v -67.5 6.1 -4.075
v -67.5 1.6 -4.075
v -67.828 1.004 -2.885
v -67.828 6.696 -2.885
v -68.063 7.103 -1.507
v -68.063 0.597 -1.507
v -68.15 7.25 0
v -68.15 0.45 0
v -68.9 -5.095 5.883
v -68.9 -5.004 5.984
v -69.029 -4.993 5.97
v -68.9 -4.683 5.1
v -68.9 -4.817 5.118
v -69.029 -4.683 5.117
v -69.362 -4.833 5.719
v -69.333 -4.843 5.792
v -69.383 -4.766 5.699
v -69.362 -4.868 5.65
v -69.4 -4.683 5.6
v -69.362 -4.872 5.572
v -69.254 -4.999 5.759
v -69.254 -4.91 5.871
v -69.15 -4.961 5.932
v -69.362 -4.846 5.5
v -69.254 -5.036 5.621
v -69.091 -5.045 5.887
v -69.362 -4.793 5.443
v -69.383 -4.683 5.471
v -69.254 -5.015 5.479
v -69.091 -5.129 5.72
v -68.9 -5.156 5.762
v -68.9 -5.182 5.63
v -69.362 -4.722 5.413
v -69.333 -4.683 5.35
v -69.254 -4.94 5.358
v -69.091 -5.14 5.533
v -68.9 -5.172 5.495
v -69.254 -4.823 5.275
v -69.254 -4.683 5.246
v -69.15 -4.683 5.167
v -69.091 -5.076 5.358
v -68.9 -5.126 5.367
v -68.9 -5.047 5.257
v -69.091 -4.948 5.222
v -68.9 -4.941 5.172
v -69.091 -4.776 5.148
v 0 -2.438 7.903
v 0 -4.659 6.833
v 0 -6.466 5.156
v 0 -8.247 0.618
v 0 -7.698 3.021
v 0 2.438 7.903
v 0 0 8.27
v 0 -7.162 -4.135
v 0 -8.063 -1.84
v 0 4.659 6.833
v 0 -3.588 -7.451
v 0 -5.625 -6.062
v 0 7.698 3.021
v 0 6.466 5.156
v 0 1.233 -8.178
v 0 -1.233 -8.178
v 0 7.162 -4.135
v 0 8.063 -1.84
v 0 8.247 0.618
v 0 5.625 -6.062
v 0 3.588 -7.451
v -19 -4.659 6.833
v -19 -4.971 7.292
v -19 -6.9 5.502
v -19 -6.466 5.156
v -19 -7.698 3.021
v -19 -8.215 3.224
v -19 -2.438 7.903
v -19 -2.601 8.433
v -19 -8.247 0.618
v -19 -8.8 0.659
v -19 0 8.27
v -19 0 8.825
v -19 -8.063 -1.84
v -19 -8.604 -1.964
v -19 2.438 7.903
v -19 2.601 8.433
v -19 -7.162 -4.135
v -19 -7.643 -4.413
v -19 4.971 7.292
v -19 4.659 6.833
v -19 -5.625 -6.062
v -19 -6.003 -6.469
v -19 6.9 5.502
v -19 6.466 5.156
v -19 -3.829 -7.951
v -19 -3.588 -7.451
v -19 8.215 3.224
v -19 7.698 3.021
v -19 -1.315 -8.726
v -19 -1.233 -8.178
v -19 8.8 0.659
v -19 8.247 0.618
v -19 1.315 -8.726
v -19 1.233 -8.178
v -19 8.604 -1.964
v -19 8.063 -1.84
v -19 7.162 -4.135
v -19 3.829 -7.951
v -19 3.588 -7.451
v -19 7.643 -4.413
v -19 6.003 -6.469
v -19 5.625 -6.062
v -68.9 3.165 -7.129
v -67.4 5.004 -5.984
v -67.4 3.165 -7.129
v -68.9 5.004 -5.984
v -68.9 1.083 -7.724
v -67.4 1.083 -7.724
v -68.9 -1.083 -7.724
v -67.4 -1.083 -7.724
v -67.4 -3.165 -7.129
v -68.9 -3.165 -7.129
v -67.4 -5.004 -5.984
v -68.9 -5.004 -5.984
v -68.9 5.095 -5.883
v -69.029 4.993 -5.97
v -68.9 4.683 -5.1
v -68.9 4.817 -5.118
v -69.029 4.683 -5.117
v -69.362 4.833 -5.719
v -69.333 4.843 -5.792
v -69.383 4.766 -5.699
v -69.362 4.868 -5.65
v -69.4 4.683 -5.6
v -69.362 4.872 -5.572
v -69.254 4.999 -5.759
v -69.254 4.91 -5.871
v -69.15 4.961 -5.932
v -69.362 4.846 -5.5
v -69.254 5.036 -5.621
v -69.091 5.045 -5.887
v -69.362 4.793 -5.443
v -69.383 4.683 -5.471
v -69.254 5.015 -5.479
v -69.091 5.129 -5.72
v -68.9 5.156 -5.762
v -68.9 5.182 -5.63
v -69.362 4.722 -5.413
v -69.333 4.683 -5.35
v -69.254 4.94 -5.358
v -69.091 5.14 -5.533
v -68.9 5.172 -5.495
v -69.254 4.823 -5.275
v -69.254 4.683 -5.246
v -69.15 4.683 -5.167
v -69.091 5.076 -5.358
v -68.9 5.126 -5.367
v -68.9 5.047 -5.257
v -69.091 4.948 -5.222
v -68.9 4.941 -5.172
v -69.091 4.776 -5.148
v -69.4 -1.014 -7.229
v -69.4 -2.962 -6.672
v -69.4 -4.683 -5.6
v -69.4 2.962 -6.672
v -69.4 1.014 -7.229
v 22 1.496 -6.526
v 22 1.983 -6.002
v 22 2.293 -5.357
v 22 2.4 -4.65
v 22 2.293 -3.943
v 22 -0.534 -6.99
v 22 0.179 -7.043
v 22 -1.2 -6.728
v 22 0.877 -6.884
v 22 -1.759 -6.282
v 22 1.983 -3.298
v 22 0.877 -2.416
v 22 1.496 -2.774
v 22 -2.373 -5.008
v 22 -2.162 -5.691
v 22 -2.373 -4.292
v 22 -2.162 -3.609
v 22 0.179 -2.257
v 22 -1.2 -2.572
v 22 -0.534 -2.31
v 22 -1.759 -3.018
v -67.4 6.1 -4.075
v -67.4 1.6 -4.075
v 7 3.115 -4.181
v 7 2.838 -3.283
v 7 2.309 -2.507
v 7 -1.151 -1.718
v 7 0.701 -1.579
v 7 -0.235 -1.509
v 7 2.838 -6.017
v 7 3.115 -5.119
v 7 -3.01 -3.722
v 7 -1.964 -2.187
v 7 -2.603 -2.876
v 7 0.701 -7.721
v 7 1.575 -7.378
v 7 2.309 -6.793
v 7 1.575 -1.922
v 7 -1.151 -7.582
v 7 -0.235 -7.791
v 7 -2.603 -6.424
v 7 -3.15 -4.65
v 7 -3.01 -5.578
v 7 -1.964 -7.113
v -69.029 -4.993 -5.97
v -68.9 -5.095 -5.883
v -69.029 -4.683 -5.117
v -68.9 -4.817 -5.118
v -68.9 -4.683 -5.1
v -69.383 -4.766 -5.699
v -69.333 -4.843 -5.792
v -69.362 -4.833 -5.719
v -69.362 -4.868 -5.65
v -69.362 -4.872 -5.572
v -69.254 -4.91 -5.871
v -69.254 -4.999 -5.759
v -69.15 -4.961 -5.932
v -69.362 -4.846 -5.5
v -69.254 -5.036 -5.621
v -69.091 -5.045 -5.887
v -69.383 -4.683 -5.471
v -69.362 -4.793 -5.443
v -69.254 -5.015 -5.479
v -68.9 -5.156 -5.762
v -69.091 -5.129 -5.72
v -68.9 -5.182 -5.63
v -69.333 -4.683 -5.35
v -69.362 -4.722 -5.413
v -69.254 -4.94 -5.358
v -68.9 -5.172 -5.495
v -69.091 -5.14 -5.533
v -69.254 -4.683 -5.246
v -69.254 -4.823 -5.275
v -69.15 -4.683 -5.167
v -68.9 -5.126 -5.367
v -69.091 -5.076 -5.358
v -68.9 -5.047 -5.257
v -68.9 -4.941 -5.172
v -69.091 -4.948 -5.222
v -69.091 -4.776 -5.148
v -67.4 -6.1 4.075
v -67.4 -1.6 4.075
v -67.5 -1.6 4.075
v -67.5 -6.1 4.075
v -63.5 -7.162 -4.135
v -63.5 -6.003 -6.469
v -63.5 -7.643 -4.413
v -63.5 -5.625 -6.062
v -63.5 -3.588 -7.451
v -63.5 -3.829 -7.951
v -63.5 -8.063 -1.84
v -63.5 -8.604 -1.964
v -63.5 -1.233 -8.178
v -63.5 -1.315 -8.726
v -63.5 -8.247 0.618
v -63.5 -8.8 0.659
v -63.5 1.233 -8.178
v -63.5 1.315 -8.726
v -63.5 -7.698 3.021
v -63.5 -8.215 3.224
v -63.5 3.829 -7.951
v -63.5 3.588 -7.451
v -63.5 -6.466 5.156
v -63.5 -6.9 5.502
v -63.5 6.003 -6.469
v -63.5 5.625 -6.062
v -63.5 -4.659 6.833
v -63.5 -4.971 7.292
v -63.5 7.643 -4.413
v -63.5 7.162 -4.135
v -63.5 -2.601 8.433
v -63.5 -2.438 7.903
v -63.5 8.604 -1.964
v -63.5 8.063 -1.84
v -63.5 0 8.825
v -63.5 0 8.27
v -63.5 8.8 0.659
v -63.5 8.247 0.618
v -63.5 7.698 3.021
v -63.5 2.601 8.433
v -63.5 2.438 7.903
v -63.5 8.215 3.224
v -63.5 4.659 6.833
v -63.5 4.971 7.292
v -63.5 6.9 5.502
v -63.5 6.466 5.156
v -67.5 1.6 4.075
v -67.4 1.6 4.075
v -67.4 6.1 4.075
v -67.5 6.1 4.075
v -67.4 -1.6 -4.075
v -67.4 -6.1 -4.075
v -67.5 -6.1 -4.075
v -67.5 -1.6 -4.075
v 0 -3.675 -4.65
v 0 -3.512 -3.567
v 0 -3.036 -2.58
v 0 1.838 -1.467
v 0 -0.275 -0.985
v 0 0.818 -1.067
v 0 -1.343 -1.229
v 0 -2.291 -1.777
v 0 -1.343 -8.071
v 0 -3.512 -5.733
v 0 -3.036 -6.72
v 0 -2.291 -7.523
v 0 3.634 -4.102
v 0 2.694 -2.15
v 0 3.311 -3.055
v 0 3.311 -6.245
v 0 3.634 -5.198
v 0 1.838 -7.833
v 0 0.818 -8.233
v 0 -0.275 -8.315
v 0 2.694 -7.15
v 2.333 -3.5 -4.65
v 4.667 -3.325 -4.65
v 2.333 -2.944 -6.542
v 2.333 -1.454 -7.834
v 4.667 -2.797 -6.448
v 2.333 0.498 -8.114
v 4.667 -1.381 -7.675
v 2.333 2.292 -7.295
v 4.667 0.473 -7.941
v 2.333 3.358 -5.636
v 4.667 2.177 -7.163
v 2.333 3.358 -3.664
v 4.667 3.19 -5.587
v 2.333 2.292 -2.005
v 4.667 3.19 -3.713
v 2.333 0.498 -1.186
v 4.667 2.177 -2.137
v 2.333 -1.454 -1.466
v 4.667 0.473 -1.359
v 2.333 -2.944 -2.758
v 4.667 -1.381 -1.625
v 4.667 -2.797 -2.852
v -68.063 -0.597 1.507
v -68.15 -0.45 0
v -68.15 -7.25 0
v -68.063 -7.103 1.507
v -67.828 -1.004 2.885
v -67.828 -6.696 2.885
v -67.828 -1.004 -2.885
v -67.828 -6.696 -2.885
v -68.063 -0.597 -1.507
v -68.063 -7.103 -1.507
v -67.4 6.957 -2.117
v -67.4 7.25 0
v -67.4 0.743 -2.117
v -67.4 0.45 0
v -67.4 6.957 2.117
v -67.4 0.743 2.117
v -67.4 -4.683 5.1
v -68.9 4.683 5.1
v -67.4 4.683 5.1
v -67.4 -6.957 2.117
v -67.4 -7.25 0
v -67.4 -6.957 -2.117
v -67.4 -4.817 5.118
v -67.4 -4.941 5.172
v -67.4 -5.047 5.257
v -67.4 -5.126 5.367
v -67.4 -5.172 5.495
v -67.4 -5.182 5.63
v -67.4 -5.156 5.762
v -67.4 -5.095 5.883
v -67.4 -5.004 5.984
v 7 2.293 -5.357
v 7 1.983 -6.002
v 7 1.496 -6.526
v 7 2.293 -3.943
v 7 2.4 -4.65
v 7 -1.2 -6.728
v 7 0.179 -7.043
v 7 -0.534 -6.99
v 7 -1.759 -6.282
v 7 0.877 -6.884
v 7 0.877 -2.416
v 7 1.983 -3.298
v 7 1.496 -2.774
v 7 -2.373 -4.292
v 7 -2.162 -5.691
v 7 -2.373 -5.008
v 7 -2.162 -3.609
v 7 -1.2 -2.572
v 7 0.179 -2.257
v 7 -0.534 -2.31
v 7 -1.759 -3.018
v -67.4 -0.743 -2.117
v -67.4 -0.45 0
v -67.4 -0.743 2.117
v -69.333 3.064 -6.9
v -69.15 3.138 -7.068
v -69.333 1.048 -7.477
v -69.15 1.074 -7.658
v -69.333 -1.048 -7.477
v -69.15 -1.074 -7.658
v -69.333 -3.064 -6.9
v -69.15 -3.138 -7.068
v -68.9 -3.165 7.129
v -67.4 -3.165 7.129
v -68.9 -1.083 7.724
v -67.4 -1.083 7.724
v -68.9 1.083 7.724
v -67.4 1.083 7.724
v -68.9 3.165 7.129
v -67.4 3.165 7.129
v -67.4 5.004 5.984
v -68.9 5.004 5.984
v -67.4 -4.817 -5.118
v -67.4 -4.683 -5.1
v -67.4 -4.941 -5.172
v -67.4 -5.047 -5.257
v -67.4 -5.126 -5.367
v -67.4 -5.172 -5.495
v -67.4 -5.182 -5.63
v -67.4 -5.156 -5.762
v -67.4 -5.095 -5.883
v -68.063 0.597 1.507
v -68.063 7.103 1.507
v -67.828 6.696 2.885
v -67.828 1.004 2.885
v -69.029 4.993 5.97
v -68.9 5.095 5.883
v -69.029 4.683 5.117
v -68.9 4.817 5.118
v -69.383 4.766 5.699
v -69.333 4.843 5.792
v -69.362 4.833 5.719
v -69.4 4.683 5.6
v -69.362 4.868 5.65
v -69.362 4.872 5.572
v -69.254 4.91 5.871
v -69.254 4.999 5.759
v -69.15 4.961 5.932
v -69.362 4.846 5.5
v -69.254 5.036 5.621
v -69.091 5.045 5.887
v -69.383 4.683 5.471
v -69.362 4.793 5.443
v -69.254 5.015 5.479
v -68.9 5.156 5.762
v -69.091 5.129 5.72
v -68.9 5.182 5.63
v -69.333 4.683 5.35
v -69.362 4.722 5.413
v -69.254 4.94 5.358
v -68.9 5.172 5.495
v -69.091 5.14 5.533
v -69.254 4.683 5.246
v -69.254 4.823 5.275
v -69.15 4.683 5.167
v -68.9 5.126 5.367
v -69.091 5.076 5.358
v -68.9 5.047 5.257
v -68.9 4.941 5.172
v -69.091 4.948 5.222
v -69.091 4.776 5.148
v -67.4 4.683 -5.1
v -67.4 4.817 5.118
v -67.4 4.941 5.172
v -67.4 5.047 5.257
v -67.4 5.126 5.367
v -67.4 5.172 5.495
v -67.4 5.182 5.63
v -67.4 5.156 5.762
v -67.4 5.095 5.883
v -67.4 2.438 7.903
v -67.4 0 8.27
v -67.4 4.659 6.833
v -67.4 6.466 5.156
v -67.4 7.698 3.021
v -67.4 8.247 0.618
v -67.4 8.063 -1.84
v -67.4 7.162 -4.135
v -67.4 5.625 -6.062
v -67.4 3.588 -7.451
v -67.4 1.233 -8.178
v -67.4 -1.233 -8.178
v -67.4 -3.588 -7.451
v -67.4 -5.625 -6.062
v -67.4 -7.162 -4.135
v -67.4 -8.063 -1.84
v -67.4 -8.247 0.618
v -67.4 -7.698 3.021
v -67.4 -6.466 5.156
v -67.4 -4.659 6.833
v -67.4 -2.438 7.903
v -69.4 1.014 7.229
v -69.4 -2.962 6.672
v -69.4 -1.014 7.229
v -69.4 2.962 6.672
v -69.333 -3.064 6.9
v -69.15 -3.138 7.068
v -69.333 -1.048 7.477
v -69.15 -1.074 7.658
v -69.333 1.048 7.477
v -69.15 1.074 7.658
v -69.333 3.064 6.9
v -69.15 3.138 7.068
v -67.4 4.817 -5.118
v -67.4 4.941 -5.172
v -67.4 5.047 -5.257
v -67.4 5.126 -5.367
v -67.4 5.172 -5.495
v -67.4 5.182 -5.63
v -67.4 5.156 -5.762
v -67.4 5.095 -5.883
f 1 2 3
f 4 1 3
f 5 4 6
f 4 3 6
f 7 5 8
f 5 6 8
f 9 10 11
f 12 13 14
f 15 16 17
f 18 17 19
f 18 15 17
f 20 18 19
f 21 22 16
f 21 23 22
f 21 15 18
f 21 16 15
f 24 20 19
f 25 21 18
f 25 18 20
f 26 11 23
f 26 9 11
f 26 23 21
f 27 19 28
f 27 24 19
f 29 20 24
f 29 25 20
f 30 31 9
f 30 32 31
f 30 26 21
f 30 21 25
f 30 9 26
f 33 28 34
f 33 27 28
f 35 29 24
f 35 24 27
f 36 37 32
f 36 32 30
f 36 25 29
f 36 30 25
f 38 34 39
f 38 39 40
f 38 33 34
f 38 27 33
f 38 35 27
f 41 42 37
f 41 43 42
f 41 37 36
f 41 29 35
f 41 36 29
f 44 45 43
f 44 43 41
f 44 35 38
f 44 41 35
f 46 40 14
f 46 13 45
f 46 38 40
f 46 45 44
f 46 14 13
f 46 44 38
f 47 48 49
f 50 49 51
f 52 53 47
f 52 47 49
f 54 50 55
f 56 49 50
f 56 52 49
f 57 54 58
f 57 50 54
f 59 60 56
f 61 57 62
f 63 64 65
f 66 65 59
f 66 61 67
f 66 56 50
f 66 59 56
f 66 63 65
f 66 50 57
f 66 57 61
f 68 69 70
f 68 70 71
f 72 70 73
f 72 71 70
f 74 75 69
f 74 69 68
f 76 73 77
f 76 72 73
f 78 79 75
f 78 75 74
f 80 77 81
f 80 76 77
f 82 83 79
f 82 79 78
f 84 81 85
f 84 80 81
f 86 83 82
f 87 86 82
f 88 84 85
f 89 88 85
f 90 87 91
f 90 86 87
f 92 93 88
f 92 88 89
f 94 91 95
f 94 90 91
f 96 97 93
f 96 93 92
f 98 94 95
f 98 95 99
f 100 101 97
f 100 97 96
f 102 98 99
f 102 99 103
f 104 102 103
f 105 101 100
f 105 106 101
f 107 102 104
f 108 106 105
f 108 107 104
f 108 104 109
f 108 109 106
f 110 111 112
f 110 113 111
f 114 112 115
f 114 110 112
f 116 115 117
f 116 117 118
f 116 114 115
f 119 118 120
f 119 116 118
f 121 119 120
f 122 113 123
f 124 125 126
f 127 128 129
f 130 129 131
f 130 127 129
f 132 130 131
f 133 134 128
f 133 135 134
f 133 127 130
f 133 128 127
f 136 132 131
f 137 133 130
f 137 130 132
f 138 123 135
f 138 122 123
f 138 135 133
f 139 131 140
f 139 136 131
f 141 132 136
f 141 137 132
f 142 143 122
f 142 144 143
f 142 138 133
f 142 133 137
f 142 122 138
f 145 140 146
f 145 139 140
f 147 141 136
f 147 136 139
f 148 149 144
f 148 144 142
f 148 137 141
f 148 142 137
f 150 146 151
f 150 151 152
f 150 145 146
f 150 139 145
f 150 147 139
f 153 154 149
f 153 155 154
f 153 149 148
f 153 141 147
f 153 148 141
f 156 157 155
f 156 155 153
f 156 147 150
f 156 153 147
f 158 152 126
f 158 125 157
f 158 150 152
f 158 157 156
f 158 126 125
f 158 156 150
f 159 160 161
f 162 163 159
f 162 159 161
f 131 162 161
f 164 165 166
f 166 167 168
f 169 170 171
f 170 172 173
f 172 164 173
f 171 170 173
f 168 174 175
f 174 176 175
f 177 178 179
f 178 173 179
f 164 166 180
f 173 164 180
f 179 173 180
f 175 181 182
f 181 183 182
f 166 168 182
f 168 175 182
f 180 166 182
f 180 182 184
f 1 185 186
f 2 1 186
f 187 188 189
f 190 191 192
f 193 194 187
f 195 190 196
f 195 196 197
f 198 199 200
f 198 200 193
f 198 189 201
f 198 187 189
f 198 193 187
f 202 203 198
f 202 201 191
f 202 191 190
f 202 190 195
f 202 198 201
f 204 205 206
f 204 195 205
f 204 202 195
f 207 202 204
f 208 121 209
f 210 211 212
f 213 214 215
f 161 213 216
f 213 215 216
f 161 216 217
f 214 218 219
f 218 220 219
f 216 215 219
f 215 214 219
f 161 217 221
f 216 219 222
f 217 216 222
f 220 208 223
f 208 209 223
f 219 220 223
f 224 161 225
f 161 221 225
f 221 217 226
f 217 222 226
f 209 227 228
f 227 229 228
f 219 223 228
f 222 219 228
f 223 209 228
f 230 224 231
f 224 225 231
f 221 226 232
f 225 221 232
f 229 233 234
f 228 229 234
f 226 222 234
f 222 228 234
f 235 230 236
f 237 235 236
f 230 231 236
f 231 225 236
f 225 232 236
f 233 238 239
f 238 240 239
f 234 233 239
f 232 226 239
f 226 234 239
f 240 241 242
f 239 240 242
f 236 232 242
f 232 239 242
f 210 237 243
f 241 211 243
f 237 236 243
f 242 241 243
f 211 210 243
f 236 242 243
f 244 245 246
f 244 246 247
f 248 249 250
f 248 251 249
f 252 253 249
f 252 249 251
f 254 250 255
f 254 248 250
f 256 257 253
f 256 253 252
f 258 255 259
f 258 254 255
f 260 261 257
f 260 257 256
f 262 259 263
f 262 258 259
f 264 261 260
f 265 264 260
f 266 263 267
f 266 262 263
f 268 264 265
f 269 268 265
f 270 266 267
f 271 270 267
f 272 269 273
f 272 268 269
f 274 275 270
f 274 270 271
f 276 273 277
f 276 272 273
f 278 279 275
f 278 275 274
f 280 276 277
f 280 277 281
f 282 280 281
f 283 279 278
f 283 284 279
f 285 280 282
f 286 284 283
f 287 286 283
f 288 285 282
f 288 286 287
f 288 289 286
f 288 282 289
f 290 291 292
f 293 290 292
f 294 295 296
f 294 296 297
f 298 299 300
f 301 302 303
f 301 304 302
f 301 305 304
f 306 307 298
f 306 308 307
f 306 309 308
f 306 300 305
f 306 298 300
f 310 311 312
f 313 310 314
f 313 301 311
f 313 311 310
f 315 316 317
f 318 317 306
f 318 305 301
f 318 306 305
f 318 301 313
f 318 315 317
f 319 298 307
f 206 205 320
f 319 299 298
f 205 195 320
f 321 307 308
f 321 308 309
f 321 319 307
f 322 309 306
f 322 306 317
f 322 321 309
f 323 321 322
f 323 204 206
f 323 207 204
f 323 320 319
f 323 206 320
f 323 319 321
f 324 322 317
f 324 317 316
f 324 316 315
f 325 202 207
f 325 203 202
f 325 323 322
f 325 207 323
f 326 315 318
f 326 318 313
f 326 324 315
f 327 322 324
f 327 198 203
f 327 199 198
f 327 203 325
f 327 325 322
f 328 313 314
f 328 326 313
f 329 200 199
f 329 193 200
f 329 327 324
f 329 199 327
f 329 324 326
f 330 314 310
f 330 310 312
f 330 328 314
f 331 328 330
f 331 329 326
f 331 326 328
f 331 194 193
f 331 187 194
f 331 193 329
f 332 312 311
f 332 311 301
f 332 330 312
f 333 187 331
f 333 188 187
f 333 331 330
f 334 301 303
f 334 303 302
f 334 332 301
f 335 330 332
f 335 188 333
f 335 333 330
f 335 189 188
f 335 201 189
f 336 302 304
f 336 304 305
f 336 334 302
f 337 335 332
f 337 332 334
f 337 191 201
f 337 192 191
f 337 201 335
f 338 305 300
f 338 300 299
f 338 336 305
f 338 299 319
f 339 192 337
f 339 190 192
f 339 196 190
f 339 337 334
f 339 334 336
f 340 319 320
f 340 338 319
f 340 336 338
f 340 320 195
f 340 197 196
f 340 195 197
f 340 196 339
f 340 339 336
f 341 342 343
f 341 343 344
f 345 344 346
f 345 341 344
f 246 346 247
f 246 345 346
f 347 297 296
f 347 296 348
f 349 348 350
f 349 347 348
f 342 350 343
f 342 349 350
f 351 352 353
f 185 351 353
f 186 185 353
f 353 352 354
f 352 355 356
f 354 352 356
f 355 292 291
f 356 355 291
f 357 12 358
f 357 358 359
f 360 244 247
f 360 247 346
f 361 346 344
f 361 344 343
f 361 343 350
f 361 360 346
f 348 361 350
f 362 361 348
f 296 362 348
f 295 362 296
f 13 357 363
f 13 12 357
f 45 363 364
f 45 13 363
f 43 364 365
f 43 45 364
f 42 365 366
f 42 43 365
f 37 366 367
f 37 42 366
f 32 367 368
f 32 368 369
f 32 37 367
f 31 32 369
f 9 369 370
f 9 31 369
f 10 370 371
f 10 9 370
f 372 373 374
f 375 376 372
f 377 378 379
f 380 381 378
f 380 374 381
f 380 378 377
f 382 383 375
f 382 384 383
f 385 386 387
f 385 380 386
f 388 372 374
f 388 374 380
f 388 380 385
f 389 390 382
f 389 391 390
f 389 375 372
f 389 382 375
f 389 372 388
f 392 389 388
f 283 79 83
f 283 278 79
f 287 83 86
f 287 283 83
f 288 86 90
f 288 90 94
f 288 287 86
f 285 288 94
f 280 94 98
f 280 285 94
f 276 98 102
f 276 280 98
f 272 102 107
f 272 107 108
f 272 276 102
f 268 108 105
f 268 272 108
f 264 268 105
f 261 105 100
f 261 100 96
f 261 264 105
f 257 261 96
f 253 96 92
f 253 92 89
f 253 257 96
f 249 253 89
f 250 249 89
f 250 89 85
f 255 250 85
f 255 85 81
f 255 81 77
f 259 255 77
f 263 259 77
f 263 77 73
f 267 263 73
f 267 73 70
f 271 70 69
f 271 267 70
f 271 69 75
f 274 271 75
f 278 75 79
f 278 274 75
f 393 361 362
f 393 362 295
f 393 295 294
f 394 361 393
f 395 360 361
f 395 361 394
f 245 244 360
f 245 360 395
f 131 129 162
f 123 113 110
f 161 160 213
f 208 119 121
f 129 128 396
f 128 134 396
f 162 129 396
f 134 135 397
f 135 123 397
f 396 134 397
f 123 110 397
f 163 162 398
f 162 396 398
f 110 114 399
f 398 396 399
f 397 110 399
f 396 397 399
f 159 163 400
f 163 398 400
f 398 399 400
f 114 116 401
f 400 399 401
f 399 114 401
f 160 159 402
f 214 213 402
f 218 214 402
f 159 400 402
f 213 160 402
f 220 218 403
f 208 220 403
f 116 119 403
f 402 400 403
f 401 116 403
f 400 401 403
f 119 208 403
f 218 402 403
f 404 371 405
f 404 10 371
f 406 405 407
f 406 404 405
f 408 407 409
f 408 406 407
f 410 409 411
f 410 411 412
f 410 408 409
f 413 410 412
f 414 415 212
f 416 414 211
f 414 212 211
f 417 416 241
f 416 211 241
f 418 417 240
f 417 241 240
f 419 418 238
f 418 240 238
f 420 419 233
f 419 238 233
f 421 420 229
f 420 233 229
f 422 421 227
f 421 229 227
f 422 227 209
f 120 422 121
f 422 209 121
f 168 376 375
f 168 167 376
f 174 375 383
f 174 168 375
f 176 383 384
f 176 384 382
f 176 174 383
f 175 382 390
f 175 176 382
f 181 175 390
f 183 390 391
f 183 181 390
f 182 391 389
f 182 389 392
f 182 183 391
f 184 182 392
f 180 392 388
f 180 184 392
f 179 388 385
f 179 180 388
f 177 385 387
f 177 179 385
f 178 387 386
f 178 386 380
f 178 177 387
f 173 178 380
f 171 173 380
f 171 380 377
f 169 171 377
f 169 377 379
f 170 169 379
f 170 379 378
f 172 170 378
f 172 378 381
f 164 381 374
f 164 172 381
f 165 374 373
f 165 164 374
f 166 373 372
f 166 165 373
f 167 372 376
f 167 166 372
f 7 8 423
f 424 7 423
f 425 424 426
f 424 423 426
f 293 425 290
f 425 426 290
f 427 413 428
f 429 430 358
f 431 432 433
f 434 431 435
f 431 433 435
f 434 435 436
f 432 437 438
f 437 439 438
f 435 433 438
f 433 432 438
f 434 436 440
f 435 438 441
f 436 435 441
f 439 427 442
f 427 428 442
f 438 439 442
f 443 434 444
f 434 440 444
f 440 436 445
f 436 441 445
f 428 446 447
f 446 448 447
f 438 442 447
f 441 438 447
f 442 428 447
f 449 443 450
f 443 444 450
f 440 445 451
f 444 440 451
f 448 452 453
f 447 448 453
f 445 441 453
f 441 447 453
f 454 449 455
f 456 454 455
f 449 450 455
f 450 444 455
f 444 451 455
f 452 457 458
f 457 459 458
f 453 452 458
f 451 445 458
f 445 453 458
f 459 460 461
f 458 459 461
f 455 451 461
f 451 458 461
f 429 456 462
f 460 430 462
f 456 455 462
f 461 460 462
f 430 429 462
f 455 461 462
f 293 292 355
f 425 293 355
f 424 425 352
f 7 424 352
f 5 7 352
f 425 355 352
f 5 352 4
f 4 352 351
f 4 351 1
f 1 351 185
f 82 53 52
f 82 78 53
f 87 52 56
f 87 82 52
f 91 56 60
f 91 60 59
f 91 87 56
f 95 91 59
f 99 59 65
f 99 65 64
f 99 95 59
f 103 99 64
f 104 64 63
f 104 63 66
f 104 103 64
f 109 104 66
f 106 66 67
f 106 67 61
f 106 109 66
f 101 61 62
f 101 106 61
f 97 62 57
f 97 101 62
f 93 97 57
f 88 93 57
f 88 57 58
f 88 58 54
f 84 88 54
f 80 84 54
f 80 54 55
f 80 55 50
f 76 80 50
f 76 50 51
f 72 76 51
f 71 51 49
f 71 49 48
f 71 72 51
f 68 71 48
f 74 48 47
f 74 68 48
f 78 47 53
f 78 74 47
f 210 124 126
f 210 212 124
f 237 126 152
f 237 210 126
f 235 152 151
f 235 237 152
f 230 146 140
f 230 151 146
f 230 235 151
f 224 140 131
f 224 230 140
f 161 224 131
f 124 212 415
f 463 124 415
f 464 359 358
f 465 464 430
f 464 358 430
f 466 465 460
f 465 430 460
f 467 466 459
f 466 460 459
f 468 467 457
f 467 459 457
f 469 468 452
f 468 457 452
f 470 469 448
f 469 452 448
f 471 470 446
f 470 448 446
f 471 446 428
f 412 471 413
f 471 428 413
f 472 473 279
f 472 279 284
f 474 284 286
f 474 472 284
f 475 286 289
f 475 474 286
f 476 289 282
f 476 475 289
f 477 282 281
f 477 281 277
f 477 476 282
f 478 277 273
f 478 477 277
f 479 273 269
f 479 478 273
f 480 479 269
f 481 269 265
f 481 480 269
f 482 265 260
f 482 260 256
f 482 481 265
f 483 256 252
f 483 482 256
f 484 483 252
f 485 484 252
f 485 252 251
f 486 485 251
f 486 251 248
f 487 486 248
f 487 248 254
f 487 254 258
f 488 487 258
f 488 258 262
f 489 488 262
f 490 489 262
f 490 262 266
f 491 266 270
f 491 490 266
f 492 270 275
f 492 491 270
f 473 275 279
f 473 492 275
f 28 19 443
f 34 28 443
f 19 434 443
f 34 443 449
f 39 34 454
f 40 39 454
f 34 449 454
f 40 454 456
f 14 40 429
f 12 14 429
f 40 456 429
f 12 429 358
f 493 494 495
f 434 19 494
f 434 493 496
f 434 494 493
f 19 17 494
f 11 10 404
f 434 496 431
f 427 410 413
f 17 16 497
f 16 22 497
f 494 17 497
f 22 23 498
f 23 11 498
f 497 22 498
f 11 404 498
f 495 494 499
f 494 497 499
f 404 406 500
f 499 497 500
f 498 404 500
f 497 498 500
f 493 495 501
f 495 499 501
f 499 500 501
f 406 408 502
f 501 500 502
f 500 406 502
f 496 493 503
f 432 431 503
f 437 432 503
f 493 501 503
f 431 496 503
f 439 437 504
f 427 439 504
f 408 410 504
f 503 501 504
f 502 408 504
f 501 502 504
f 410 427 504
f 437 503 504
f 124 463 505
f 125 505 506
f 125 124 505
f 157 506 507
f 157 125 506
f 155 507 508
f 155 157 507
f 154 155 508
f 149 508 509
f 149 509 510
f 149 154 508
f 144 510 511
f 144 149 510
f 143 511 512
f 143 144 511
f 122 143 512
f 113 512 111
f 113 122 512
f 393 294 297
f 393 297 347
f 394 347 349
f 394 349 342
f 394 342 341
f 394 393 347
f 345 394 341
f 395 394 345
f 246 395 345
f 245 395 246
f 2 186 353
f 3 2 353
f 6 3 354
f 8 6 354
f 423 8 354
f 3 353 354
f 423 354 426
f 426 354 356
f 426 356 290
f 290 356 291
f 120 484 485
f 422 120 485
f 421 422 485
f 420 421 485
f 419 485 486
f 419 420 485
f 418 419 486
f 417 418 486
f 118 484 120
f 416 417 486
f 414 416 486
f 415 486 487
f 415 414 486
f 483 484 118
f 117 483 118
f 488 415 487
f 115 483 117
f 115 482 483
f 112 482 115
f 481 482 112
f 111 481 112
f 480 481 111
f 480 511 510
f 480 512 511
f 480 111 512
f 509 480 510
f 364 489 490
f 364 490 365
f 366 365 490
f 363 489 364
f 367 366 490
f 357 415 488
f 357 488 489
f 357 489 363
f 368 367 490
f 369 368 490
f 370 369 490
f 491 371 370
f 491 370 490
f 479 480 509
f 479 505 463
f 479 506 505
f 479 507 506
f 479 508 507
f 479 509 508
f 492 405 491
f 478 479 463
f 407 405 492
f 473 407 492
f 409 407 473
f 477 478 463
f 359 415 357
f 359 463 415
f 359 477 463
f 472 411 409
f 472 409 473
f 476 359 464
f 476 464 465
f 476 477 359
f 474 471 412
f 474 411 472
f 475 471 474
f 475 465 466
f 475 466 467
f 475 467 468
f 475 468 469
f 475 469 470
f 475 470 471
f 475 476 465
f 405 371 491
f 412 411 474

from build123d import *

# Parameters (mm, degrees)
F2_W      = 2
F2_H      = 10.2
F3_DEPTH  = 12.5
F4_R      = 0.5
F8_W      = 15
F8_H      = 2.4
F11_DEPTH = 0.75
F13_DEPTH = 8.826


with BuildPart() as f1:
    # F0 (on Front) → F1 (revolve)
    with BuildSketch(Plane.XZ):
        Polygon((-69.4, 7.8), (-69.4, 0), (0, 0), (0, 8.27), (-19, 8.27), (-19, 8.825), (-63.5, 8.825), (-63.5, 8.27), (-67.4, 8.27), (-67.4, 7.8), align=None)
    revolve(axis=Axis((-34.7, 0, 0), (-1, 0, 0)))

    # F2 (on Front) → F3 (cut, symmetric)
    with BuildSketch(Plane.XZ):
        with Locations((-68.4, 0)):
            Rectangle(F2_W, F2_H)
    extrude(amount=F3_DEPTH, both=True, mode=Mode.SUBTRACT)

    # F4
    f4_edges = [f1.edges().sort_by_distance(p)[0] for p in [
        (-69.4, 0, 5.1),
        (-68.4, 5.901695, 5.1),
        (-68.4, -5.901695, 5.1),
        (-69.4, 0, 7.8),
        (-68.4, 5.901695, -5.1),
        (-68.4, -5.901695, -5.1),
        (-69.4, 0, -7.8),
        (-69.4, 0, -5.1),
    ]]
    fillet(f4_edges, radius=F4_R)


with BuildPart() as f7:
    # F6 (on offset) → F7 (revolve)
    with BuildSketch(Plane.XY.offset(-4.65)):
        Polygon((0, 0), (0, -3.675), (7, -3.15), (7, 0), align=None)
    revolve(axis=Axis((3.5, 0, -4.65), (1, 0, 0)))


with BuildPart() as f9:
    # F8 (on offset) → F9 (revolve)
    with BuildSketch(Plane.XY.offset(-4.65)):
        with Locations((14.5, 1.2)):
            Rectangle(F8_W, F8_H)
    revolve(axis=Axis((14.5, 0, -4.65), (1, 0, 0)))


with BuildPart() as f11:
    # F10 (on face) → F11 (new body)
    with BuildSketch(Plane(origin=(-67.4, 0, 0), x_dir=(0, -1, 0), z_dir=(-1, 0, 0))):
        with BuildLine():
            Line((-1.6, 4.075), (-6.1, 4.075))
            ThreePointArc((-6.1, 4.075), (-7.25, 0), (-6.1, -4.075))
            Line((-6.1, -4.075), (-1.6, -4.075))
            ThreePointArc((-1.6, -4.075), (-0.45, 0), (-1.6, 4.075))
        make_face()
    extrude(amount=F11_DEPTH)

    # F12 (on Front) → F13 (cut, through all)
    with BuildSketch(Plane.XZ):
        with BuildLine():
            ThreePointArc((-67.5, -4.075), (-67.9864793145, -2.0632574367), (-68.15, 0))
            Line((-68.15, 0), (-68.15, -4.075))
            Line((-68.15, -4.075), (-67.5, -4.075))
        make_face()
        with BuildLine():
            ThreePointArc((-68.15, 0), (-67.9864793145, 2.0632574367), (-67.5, 4.075))
            Line((-67.5, 4.075), (-68.15, 4.075))
            Line((-68.15, 4.075), (-68.15, 0))
        make_face()
    extrude(amount=-F13_DEPTH, mode=Mode.SUBTRACT)


with BuildPart() as f14_1:
    # F14: instance of F11
    add(f11.part.mirror(Plane.XZ))


solid = Compound([f1.part, f7.part, f9.part, f11.part, f14_1.part])
